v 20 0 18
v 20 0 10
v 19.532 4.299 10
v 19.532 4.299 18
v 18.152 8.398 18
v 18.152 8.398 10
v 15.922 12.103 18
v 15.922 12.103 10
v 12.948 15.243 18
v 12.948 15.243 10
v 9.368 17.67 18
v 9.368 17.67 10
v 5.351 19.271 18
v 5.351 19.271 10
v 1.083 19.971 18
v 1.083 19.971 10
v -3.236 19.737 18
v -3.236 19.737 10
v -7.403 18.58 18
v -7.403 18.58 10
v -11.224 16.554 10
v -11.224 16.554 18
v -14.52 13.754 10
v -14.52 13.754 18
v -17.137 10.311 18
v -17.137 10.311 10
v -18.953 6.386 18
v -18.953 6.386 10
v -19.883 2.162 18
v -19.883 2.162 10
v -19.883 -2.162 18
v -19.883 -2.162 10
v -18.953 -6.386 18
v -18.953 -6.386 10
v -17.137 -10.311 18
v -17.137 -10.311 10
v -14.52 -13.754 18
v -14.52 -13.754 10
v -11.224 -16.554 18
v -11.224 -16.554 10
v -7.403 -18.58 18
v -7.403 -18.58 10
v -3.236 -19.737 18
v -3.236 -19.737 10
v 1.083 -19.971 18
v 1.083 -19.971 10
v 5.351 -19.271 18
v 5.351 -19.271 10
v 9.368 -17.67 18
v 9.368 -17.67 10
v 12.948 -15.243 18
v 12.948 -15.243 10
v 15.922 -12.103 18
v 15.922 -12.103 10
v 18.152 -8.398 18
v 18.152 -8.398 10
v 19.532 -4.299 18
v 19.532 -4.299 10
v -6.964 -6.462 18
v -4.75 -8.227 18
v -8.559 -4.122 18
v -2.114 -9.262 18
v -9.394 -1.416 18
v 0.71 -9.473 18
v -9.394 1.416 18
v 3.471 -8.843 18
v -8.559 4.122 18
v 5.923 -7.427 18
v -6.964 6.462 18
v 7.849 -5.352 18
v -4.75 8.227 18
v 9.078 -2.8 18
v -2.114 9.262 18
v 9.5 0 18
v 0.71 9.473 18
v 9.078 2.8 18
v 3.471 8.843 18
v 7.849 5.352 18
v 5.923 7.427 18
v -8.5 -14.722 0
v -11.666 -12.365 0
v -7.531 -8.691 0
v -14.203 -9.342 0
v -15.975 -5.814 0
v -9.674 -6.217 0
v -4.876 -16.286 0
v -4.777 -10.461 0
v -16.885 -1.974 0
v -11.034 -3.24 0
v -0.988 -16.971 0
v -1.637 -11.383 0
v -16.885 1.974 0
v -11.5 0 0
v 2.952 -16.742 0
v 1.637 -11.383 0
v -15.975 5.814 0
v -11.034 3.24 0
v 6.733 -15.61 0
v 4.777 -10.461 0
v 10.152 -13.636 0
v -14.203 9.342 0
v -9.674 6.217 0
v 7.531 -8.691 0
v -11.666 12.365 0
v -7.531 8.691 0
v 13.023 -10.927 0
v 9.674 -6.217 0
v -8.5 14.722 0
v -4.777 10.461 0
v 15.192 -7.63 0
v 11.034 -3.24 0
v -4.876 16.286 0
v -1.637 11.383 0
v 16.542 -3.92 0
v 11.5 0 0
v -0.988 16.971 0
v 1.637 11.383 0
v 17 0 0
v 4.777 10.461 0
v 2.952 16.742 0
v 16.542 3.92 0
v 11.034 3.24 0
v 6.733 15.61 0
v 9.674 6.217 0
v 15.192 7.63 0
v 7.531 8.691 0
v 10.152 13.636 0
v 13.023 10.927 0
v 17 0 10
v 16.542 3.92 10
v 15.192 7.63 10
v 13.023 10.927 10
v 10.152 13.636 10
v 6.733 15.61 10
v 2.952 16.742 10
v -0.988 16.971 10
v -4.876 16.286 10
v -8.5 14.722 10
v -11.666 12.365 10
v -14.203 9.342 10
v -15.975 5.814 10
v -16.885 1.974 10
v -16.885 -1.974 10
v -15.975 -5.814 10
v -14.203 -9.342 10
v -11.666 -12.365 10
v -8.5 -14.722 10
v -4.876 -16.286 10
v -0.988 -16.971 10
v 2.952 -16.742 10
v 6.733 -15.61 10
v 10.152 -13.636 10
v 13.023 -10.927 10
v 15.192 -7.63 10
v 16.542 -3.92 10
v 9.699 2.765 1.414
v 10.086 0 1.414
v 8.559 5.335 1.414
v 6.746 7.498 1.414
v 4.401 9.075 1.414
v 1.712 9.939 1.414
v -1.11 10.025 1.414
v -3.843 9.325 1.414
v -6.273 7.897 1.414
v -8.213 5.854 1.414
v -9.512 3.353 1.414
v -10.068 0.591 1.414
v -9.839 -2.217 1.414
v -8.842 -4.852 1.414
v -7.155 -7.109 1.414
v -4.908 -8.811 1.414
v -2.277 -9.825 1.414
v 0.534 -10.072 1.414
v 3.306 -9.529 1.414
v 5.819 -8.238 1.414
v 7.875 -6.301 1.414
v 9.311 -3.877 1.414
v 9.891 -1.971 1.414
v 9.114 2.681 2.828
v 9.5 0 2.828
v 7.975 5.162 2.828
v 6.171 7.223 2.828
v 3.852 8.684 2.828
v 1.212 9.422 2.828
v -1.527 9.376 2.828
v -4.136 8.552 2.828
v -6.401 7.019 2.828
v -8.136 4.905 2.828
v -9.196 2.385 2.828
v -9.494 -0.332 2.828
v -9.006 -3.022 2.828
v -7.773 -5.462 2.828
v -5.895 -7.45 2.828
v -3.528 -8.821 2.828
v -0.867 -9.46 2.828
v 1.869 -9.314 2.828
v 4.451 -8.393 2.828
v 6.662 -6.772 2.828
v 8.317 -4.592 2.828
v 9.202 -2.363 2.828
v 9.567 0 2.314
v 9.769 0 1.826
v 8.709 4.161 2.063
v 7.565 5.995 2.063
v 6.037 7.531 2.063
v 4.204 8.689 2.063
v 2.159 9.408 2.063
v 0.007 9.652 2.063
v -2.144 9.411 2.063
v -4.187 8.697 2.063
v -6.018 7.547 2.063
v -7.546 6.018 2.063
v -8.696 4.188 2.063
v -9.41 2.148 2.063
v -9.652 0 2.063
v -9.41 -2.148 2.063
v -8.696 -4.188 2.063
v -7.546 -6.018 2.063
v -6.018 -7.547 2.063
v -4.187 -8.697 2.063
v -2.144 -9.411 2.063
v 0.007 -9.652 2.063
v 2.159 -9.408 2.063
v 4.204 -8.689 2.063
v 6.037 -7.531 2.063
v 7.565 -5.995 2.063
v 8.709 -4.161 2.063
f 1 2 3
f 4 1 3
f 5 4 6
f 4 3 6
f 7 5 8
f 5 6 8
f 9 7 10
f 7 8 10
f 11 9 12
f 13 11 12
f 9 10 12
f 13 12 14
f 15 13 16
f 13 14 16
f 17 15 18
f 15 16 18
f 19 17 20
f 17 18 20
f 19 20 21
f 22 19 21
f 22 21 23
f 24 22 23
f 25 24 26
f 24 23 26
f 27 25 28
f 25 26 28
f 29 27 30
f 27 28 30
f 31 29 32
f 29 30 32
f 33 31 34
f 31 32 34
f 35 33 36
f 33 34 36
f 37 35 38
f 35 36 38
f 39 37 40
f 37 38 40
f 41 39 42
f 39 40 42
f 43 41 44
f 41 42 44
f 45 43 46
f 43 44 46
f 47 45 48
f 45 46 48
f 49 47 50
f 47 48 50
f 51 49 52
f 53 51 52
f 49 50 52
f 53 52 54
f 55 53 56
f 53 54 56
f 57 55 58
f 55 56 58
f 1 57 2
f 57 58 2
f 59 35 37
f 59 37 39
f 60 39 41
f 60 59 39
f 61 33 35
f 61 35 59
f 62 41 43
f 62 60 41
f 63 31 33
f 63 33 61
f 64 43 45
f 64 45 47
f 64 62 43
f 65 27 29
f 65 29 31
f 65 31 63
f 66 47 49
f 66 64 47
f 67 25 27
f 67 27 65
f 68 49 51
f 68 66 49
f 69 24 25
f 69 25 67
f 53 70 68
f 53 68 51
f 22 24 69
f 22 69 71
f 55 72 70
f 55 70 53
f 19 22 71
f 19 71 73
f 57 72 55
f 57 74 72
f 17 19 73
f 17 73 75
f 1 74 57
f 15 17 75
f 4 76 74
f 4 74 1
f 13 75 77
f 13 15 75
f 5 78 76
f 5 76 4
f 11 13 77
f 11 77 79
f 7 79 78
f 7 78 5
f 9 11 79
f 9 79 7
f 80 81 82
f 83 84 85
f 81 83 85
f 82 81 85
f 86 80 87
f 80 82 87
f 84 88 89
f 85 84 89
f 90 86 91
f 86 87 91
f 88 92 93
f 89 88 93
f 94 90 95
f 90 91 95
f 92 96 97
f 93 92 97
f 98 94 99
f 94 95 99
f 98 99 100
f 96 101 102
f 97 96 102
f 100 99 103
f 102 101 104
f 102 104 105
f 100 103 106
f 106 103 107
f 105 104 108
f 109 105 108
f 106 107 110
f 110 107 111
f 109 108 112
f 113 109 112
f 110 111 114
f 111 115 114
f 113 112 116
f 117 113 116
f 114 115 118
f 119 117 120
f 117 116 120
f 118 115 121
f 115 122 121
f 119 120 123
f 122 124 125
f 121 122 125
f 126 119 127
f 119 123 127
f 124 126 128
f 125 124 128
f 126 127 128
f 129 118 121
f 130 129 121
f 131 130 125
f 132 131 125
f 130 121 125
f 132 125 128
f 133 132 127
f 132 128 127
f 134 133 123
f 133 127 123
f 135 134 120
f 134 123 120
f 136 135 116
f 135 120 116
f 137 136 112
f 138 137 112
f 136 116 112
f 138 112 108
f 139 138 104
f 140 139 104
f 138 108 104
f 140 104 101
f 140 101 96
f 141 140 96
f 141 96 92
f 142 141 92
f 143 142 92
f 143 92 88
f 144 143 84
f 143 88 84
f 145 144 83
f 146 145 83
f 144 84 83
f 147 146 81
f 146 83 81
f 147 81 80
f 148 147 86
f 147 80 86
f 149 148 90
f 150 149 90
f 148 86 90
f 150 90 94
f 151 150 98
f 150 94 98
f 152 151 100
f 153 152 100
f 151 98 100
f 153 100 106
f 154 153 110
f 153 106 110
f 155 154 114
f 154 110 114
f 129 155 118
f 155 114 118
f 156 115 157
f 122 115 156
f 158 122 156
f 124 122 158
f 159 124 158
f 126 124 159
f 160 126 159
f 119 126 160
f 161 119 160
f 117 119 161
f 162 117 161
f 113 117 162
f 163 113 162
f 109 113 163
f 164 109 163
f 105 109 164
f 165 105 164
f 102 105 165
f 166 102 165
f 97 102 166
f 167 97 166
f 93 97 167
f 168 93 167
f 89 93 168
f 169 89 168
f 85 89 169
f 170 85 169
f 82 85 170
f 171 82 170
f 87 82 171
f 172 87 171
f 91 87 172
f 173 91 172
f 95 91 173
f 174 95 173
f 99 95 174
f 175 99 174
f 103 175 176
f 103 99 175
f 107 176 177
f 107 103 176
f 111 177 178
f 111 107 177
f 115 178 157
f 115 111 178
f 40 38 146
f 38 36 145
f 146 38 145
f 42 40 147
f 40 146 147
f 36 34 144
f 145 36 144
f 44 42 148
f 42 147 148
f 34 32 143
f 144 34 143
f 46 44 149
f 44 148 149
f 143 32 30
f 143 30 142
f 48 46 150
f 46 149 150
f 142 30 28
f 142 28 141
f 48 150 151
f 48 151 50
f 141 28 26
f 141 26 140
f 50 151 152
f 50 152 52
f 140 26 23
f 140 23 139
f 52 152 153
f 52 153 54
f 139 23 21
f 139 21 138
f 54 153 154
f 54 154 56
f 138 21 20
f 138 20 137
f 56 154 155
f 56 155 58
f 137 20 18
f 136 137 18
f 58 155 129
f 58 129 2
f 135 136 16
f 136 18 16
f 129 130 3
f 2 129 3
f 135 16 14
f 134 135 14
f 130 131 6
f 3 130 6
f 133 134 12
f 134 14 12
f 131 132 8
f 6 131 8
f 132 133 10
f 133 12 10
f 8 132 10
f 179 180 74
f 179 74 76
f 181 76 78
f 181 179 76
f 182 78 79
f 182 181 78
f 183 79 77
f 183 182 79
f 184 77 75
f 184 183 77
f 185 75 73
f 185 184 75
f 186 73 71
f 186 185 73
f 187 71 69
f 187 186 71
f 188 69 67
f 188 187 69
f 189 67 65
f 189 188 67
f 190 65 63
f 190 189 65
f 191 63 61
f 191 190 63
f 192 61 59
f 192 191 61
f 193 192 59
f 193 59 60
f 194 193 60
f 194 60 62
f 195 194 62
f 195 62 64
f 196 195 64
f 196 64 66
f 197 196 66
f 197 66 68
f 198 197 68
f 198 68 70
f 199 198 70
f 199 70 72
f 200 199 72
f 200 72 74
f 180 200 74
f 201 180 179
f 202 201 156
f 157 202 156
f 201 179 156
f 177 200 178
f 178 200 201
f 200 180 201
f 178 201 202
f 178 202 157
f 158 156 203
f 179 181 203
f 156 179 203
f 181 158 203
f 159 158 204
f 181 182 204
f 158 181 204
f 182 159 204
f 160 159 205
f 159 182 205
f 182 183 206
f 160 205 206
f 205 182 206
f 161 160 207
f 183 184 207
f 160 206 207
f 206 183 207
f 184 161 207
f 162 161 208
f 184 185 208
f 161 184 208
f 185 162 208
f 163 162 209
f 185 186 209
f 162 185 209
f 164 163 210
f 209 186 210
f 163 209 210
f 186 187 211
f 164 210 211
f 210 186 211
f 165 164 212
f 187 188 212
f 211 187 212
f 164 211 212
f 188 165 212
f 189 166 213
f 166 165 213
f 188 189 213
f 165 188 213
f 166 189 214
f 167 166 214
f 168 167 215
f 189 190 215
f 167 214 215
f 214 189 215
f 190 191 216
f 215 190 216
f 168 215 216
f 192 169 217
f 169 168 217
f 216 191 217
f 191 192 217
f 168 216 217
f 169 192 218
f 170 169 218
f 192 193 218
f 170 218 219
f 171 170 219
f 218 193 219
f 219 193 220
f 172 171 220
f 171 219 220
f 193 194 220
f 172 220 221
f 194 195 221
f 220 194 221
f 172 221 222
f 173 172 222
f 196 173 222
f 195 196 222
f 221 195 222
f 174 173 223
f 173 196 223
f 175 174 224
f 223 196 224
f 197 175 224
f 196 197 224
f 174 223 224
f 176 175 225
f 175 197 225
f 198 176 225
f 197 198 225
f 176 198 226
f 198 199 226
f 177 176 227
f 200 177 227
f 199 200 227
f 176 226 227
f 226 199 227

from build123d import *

# Parameters (mm, degrees)
SKETCH1_R           = 17
SKETCH1_R_2         = 9.5
BOSS_EXTRUDE1_DEPTH = 10
SKETCH2_R           = 20
SKETCH2_R_2         = 9.5
BOSS_EXTRUDE2_DEPTH = 8
CHAMFER1_SIZE       = 2
FILLET1_R           = 2


with BuildPart() as part:
    # Sketch1 → Boss-Extrude1 (new body)
    with BuildSketch(Plane.XY):
        Circle(SKETCH1_R)
        Circle(SKETCH1_R_2, mode=Mode.SUBTRACT)
    extrude(amount=BOSS_EXTRUDE1_DEPTH)

    # Sketch2 → Boss-Extrude2 (add)
    with BuildSketch(Plane.XY.offset(10)):
        Circle(SKETCH2_R)
        Circle(SKETCH2_R_2, mode=Mode.SUBTRACT)
    extrude(amount=BOSS_EXTRUDE2_DEPTH)

    # Chamfer1
    chamfer1_edges = [part.edges().sort_by_distance(p)[0] for p in [
        (-9.5, 0, 0),
    ]]
    chamfer(chamfer1_edges, length=CHAMFER1_SIZE)

    # Fillet1
    fillet1_edges = [part.edges().sort_by_distance(p)[0] for p in [
        (-9.5, 0, 2),
    ]]
    fillet(fillet1_edges, radius=FILLET1_R)


solid = part.part
